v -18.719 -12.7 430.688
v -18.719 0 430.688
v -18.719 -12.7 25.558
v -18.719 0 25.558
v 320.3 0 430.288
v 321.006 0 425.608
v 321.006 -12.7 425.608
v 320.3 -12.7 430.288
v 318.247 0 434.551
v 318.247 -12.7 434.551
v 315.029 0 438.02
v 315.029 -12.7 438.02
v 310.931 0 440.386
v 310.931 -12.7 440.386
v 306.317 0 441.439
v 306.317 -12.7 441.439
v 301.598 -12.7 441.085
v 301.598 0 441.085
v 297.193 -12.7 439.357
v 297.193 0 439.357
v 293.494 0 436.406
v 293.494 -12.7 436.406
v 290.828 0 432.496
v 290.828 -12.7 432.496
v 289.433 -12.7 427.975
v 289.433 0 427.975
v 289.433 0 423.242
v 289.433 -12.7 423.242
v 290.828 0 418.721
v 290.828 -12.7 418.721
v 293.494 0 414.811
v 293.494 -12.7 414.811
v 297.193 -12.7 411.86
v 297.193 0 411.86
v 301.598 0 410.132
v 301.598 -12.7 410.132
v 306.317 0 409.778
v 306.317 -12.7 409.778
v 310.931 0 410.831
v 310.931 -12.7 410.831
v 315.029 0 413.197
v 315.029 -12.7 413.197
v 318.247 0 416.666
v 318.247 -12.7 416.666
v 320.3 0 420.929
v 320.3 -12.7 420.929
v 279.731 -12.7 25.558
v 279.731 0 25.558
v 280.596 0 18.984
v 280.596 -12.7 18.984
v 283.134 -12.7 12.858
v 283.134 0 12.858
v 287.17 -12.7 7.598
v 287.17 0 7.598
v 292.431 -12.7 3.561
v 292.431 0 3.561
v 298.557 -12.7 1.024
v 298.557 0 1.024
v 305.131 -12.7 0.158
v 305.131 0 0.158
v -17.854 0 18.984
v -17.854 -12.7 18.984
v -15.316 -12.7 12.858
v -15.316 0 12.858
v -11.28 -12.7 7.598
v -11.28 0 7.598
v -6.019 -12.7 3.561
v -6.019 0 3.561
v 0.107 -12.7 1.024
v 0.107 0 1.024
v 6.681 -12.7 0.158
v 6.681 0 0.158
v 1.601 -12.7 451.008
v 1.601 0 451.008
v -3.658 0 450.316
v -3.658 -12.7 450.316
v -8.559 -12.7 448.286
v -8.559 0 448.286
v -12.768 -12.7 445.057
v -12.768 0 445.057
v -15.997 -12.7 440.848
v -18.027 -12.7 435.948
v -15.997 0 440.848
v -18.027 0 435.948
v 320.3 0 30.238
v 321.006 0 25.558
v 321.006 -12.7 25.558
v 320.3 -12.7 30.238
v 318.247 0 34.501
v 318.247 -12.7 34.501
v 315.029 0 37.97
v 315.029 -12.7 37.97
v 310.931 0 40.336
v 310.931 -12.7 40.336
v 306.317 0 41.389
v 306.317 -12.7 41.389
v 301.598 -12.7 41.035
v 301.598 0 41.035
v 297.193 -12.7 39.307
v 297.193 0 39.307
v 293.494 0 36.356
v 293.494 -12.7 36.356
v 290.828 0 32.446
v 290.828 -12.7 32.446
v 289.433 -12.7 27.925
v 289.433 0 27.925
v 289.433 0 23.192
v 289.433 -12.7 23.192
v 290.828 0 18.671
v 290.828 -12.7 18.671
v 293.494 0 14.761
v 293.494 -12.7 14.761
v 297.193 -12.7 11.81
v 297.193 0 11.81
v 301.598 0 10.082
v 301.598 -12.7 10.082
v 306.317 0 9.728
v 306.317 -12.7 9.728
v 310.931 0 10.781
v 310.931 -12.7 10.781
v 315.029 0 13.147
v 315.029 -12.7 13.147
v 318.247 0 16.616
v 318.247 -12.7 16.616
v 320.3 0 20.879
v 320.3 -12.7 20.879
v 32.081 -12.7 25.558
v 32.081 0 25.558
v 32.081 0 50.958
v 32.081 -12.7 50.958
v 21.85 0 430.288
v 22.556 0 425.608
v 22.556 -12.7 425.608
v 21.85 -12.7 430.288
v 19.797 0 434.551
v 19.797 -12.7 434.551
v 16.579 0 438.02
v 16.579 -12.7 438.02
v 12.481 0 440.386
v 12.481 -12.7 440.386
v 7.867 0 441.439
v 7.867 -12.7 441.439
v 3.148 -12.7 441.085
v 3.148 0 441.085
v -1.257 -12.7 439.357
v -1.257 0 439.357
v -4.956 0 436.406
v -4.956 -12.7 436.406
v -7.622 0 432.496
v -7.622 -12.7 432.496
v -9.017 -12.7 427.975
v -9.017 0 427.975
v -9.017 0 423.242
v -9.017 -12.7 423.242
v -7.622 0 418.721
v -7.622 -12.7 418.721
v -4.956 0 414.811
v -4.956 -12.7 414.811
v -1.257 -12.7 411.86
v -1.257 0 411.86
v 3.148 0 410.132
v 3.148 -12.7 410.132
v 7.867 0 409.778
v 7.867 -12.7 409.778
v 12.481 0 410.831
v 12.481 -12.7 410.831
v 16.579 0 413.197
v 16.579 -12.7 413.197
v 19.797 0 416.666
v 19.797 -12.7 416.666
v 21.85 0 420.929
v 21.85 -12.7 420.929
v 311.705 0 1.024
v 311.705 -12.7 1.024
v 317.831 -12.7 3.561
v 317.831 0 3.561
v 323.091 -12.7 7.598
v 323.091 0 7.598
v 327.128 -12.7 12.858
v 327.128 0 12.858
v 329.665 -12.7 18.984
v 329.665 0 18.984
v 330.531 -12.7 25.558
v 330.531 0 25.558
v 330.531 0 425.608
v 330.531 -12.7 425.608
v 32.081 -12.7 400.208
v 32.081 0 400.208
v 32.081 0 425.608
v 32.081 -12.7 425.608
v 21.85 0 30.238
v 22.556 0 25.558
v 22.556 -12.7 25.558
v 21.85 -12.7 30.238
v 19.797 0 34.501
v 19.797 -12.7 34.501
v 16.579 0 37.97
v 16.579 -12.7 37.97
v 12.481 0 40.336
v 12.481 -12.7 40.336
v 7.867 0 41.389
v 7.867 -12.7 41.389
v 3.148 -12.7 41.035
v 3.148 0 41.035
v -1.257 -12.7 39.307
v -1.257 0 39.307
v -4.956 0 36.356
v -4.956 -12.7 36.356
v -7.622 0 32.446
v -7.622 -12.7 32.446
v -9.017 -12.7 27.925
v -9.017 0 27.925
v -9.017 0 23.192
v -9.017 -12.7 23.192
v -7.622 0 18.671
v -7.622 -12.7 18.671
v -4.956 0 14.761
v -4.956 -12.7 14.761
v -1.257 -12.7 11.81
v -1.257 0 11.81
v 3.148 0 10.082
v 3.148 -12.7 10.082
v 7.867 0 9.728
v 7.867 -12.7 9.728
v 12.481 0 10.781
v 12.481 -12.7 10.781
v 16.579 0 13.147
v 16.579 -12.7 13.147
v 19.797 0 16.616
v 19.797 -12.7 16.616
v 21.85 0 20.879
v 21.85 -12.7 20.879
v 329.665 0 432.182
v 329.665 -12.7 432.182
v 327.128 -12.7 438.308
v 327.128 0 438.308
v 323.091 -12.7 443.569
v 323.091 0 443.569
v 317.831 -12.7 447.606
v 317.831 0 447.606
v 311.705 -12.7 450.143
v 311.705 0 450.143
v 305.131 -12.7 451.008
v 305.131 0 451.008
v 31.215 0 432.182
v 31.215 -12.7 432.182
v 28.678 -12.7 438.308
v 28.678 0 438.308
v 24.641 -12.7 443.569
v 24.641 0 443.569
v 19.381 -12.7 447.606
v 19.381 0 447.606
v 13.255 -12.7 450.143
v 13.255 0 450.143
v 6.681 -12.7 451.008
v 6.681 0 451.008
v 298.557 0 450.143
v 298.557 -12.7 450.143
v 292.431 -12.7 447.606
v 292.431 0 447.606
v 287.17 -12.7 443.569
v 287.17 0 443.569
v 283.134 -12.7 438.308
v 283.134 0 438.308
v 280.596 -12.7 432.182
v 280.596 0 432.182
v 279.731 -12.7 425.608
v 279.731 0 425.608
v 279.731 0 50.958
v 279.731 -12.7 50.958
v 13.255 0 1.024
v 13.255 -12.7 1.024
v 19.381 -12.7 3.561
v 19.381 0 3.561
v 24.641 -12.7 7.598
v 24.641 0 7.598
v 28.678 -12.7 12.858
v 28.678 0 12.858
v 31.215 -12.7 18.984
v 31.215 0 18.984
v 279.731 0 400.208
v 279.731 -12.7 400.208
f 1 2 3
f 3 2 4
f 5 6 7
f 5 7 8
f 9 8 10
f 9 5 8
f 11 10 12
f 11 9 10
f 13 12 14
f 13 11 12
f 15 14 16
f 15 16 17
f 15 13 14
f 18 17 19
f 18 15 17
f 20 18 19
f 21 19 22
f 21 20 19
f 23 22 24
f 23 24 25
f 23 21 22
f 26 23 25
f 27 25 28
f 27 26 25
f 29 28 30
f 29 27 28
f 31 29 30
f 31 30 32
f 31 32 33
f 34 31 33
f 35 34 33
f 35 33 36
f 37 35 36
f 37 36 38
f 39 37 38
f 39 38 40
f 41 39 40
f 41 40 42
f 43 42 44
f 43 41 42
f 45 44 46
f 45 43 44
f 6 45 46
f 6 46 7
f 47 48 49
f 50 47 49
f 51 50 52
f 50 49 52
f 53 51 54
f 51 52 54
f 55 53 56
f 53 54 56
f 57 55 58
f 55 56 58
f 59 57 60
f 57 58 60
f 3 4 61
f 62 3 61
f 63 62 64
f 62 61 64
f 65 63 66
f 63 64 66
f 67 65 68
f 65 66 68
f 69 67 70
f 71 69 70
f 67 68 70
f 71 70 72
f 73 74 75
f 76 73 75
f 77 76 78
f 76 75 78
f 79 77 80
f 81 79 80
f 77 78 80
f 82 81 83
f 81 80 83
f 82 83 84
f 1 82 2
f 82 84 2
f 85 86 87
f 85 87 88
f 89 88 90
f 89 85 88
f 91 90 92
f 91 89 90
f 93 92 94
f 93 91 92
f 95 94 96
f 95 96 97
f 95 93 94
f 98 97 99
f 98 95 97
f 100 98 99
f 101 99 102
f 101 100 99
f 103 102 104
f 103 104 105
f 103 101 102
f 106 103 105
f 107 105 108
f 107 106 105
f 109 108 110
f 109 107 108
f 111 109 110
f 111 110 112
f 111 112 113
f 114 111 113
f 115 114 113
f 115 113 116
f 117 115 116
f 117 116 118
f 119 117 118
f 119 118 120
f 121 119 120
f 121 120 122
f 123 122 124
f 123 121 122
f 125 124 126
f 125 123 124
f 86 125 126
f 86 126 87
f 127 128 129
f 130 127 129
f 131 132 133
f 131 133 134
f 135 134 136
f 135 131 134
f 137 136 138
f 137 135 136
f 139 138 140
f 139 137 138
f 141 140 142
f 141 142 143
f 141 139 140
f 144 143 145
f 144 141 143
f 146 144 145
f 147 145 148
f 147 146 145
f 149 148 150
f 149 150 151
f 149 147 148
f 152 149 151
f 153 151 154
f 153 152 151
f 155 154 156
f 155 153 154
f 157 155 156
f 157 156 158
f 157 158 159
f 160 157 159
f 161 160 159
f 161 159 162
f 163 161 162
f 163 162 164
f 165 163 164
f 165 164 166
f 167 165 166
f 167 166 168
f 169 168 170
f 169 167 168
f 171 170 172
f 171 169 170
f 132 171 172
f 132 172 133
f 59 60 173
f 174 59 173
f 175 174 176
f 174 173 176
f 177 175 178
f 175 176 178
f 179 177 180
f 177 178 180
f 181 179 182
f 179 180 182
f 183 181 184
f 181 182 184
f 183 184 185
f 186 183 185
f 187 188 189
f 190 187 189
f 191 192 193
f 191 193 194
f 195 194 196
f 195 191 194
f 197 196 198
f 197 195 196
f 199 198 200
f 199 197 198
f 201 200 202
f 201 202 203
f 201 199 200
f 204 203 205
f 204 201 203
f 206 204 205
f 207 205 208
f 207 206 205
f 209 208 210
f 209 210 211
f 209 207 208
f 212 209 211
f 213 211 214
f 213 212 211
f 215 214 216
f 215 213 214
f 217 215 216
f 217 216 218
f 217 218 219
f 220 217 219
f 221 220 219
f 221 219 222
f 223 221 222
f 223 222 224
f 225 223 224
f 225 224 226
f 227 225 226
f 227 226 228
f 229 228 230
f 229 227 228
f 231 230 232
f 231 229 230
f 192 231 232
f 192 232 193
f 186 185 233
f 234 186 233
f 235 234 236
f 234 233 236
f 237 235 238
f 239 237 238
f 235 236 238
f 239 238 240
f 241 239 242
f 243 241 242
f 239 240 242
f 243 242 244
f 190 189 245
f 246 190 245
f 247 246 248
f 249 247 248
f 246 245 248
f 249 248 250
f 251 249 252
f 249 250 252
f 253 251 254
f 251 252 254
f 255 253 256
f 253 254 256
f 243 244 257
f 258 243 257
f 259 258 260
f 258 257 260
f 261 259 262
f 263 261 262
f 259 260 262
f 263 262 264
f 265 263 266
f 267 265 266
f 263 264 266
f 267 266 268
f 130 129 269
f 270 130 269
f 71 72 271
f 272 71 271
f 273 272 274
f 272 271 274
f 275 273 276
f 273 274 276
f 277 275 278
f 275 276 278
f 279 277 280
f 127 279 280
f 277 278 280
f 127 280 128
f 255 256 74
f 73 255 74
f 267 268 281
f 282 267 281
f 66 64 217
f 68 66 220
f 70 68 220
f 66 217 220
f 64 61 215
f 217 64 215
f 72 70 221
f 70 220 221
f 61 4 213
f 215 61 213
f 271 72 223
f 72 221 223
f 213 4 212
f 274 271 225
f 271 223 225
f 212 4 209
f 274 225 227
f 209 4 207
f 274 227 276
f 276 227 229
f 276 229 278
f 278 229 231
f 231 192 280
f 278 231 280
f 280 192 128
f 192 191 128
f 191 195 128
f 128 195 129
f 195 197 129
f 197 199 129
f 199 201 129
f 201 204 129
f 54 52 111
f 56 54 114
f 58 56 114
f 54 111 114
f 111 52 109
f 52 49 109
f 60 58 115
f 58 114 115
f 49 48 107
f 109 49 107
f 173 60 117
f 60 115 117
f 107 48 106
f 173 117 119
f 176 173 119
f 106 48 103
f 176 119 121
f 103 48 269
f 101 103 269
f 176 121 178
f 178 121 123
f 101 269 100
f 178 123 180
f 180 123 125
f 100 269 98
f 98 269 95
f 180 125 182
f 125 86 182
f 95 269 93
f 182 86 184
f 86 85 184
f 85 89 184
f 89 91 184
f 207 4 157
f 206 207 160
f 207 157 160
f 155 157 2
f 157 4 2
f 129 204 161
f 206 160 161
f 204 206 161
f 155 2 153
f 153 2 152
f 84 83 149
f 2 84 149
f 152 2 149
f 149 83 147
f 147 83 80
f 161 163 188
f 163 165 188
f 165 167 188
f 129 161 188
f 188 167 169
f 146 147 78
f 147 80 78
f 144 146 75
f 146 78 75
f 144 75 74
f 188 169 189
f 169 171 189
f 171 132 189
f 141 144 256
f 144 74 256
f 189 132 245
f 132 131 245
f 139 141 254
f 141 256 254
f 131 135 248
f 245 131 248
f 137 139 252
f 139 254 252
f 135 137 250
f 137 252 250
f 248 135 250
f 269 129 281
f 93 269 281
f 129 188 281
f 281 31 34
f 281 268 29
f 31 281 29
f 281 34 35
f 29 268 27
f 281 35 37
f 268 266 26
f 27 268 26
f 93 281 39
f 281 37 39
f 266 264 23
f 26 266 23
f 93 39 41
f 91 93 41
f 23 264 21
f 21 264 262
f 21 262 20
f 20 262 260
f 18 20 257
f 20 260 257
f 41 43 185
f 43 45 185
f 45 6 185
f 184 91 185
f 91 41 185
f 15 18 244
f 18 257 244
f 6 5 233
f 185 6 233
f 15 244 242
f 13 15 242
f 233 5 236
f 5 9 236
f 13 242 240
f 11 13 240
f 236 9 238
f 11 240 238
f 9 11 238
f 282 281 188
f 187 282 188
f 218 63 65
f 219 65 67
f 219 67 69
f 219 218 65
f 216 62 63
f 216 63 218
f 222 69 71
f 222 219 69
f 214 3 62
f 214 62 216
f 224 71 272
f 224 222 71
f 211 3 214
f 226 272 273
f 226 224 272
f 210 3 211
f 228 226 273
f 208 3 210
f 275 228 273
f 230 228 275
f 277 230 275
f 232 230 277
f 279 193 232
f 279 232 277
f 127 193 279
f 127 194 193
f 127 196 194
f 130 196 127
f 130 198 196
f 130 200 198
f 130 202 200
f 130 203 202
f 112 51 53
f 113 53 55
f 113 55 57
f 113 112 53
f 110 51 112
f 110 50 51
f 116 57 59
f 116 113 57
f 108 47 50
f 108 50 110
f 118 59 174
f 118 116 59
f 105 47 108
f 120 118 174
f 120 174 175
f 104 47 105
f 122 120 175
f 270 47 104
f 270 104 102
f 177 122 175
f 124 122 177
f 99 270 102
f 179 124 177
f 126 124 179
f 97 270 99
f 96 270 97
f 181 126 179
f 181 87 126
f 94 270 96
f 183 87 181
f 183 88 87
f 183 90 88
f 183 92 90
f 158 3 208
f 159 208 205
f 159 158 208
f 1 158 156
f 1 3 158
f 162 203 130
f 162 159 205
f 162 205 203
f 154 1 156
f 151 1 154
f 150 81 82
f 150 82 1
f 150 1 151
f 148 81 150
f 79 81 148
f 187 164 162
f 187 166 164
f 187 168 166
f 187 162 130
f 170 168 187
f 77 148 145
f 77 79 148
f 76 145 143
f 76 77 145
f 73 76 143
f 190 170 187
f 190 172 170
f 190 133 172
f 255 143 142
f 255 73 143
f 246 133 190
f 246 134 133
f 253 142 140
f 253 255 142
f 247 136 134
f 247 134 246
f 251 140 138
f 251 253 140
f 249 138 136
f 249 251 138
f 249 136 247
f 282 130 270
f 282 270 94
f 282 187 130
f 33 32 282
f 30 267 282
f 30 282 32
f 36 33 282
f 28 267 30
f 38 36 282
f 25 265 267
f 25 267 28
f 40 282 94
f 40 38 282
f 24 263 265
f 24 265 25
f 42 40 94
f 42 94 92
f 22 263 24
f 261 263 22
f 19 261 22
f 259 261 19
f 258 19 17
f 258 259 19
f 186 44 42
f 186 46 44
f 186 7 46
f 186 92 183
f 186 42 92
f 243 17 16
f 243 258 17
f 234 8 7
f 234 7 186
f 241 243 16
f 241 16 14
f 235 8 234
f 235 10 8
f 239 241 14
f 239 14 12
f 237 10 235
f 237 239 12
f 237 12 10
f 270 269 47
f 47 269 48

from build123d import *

# Parameters (mm, degrees)
F0_R     = 15.875
F1_DEPTH = 12.7


with BuildPart() as f1:
    # F0 (on Front) → F1 (new body)
    with BuildSketch(Plane.XZ):
        with BuildLine():
            Line((6.68072, 451.008485), (1.60072, 451.008485))
            ThreePointArc((1.60072, 451.008485), (-12.76769, 445.056895), (-18.71928, 430.688485))
            Line((-18.71928, 430.688485), (-18.71928, 25.558485))
            ThreePointArc((-18.71928, 25.558485), (-11.279792, 7.597973), (6.68072, 0.158485))
            ThreePointArc((6.68072, 0.158485), (24.641232, 7.597973), (32.08072, 25.558485))
            Line((32.08072, 25.558485), (32.08072, 50.958485))
            Line((32.08072, 50.958485), (279.73072, 50.958485))
            Line((279.73072, 50.958485), (279.73072, 25.558485))
            ThreePointArc((279.73072, 25.558485), (287.170208, 7.597973), (305.13072, 0.158485))
            ThreePointArc((305.13072, 0.158485), (323.091232, 7.597973), (330.53072, 25.558485))
            Line((330.53072, 25.558485), (330.53072, 425.608485))
            ThreePointArc((330.53072, 425.608485), (323.091232, 443.568997), (305.13072, 451.008485))
            ThreePointArc((305.13072, 451.008485), (287.170208, 443.568997), (279.73072, 425.608485))
            Line((279.73072, 425.608485), (279.73072, 400.208485))
            Line((279.73072, 400.208485), (32.08072, 400.208485))
            Line((32.08072, 400.208485), (32.08072, 425.608485))
            ThreePointArc((32.08072, 425.608485), (24.641232, 443.568997), (6.68072, 451.008485))
        make_face()
        with Locations((6.68072, 25.558485)):
            Circle(F0_R, mode=Mode.SUBTRACT)
        with Locations((305.13072, 25.558485)):
            Circle(F0_R, mode=Mode.SUBTRACT)
        with Locations((6.68072, 425.608485)):
            Circle(F0_R, mode=Mode.SUBTRACT)
        with Locations((305.13072, 425.608485)):
            Circle(F0_R, mode=Mode.SUBTRACT)
    extrude(amount=F1_DEPTH)


solid = f1.part
